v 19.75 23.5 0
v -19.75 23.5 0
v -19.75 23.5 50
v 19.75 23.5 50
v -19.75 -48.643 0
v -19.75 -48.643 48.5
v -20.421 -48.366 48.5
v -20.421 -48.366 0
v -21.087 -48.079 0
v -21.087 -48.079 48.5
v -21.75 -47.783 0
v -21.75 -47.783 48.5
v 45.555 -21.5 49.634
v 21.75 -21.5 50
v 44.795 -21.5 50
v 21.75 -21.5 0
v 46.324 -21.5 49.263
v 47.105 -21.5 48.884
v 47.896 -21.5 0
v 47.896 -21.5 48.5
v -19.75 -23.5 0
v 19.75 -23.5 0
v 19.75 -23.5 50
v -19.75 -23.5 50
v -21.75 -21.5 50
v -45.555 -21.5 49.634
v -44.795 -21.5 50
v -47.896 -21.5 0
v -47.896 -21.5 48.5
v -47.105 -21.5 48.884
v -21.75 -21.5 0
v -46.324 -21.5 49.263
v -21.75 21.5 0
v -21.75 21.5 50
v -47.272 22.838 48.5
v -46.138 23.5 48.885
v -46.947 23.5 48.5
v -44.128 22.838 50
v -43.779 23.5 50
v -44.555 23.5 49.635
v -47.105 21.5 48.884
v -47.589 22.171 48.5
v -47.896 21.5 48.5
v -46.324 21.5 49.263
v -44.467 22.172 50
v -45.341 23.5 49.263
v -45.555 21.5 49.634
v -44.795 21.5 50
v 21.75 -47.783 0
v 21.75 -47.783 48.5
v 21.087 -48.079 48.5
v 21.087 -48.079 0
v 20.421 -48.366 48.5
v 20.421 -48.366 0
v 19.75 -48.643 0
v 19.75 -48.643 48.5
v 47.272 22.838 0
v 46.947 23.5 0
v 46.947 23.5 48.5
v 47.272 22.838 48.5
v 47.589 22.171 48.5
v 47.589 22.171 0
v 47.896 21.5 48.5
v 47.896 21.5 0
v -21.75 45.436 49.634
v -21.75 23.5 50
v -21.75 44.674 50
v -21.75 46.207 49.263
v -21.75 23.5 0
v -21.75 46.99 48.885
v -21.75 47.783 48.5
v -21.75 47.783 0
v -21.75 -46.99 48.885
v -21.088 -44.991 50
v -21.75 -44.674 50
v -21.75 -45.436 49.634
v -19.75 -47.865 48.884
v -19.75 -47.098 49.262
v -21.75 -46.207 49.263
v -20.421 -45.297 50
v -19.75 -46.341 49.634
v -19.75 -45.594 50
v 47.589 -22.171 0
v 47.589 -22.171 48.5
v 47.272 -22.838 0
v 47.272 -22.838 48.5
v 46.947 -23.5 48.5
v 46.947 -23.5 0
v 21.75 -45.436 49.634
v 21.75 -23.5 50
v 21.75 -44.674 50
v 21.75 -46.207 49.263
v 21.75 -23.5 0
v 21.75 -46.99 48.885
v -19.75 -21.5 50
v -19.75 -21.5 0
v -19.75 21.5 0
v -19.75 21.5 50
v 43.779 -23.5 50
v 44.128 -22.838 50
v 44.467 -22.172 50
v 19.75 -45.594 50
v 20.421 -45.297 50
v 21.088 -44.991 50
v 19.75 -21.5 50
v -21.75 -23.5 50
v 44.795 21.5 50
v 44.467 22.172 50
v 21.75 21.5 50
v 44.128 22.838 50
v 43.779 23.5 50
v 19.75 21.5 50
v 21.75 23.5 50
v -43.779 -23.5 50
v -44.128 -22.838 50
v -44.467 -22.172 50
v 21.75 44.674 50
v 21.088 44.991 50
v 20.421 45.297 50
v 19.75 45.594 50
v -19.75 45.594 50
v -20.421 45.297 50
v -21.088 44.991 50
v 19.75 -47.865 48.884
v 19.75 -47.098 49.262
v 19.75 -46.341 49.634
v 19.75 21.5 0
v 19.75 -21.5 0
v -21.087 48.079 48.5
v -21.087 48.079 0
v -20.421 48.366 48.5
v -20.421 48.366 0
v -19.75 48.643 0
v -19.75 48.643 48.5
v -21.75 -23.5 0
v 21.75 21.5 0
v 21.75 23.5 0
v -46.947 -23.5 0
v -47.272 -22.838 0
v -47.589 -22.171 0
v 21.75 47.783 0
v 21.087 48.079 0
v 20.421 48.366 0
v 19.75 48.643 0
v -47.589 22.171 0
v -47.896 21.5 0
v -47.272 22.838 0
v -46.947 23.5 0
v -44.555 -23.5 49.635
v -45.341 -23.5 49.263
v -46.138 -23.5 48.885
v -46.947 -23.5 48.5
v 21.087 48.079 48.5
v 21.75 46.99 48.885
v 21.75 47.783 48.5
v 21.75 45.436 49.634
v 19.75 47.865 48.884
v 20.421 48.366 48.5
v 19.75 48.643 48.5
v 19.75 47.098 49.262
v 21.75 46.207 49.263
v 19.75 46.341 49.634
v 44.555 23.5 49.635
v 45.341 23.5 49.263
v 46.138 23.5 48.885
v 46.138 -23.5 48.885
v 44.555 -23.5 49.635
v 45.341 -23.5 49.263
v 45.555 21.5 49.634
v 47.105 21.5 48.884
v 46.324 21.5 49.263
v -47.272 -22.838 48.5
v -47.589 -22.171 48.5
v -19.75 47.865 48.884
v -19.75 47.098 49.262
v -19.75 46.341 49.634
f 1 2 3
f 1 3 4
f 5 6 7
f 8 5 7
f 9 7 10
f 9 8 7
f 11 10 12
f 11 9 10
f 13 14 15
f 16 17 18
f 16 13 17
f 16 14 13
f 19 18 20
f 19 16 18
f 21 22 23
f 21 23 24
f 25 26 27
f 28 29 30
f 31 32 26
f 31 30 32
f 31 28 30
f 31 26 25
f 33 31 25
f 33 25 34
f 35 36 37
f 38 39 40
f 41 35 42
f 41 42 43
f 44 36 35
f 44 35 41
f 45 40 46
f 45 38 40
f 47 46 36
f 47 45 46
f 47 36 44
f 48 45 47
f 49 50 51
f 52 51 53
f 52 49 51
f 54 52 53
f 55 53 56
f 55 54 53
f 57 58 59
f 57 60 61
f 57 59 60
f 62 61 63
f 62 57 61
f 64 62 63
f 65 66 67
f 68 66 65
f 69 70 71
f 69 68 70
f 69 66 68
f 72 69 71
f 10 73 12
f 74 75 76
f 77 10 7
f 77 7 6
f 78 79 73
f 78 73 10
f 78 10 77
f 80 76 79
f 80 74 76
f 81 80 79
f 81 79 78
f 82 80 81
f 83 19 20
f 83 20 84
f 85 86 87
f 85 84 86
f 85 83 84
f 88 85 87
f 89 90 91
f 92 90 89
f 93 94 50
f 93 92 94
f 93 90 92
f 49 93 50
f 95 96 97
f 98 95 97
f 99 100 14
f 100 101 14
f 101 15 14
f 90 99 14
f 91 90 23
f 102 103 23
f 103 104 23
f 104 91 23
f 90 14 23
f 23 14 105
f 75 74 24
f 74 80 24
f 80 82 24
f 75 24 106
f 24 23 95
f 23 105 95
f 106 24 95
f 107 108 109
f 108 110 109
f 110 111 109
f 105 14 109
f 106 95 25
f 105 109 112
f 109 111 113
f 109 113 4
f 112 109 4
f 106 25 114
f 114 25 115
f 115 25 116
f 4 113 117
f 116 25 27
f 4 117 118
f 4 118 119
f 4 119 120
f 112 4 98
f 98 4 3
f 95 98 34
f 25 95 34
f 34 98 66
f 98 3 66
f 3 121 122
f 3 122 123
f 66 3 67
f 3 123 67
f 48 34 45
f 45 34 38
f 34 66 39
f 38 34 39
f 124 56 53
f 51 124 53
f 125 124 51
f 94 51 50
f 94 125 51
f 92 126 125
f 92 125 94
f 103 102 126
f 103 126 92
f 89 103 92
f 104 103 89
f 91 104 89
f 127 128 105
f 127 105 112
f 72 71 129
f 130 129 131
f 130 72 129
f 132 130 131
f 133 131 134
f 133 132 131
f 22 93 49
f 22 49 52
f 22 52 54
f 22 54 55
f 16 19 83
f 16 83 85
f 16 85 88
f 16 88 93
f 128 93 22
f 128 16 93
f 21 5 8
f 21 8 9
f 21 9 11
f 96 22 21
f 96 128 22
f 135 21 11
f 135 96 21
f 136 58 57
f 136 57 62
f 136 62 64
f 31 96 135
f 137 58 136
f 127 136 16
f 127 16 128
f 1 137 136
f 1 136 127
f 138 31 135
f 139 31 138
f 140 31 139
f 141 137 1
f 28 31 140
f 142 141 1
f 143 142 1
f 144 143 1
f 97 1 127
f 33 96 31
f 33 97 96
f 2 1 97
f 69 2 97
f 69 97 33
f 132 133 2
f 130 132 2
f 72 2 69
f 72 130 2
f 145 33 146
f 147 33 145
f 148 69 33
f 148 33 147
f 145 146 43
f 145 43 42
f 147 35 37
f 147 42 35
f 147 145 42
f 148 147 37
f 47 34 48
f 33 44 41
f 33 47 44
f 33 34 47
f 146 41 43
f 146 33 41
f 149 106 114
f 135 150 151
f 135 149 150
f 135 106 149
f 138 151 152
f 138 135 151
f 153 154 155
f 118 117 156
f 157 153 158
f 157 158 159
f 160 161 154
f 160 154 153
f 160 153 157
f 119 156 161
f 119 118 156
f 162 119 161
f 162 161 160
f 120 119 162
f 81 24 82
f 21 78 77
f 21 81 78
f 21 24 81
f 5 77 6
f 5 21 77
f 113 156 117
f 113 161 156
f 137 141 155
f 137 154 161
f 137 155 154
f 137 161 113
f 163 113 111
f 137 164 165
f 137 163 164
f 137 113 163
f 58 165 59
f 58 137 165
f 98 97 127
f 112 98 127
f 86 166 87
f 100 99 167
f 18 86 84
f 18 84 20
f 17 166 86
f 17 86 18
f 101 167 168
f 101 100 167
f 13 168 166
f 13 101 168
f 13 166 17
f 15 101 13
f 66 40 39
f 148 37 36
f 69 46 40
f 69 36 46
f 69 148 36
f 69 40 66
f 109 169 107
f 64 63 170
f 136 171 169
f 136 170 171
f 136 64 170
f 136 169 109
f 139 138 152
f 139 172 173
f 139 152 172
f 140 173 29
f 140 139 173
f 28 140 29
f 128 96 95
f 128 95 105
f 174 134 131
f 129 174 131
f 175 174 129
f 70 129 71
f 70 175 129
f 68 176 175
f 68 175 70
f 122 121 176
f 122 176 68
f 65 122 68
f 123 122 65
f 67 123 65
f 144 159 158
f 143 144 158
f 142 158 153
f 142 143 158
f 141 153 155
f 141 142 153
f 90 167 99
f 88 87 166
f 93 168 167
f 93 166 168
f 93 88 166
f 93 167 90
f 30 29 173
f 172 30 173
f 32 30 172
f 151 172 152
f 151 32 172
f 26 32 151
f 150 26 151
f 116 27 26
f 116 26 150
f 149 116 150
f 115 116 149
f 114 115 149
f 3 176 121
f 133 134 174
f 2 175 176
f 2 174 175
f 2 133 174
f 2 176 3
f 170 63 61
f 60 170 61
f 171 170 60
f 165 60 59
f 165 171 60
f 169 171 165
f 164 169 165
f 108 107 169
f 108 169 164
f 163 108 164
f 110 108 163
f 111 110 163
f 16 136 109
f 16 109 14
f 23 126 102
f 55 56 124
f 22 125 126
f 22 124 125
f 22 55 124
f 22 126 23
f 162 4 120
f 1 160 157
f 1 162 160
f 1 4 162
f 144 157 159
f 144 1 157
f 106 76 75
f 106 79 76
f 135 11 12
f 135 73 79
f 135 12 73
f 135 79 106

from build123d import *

# Parameters (mm, degrees)
SKETCH1_W           = 39.5
SKETCH1_H           = 43
BOSS_EXTRUDE1_DEPTH = 50


with BuildPart() as part:
    # Sketch1 → Boss-Extrude1 (new body)
    with BuildSketch(Plane.XY):
        with BuildLine():
            Line((-19.75, 48.643473355), (-19.75, 23.5))
            Line((-19.75, 23.5), (19.75, 23.5))
            Line((19.75, 23.5), (19.75, 48.643473355))
            ThreePointArc((19.75, 48.643473355), (20.754462841, 48.223461844), (21.75, 47.782711309))
            Line((21.75, 47.782711309), (21.75, 23.5))
            Line((21.75, 23.5), (46.946778377, 23.5))
            ThreePointArc((46.946778377, 23.5), (47.431791843, 22.505002168), (47.895720059, 21.5))
            Line((47.895720059, 21.5), (21.75, 21.5))
            Line((21.75, 21.5), (21.75, -21.5))
            Line((21.75, -21.5), (47.895720059, -21.5))
            ThreePointArc((47.895720059, -21.5), (47.431791843, -22.505002168), (46.946778377, -23.5))
            Line((46.946778377, -23.5), (21.75, -23.5))
            Line((21.75, -23.5), (21.75, -47.782711309))
            ThreePointArc((21.75, -47.782711309), (20.754462841, -48.223461844), (19.75, -48.643473355))
            Line((19.75, -48.643473355), (19.75, -23.5))
            Line((19.75, -23.5), (-19.75, -23.5))
            Line((-19.75, -23.5), (-19.75, -48.643473355))
            ThreePointArc((-19.75, -48.643473355), (-20.754462841, -48.223461844), (-21.75, -47.782711309))
            Line((-21.75, -47.782711309), (-21.75, -23.5))
            Line((-21.75, -23.5), (-46.946778377, -23.5))
            ThreePointArc((-46.946778377, -23.5), (-47.431791843, -22.505002168), (-47.895720059, -21.5))
            Line((-47.895720059, -21.5), (-21.75, -21.5))
            Line((-21.75, -21.5), (-21.75, 21.5))
            Line((-21.75, 21.5), (-47.895720059, 21.5))
            ThreePointArc((-47.895720059, 21.5), (-47.431791843, 22.505002168), (-46.946778377, 23.5))
            Line((-46.946778377, 23.5), (-21.75, 23.5))
            Line((-21.75, 23.5), (-21.75, 47.782711309))
            ThreePointArc((-21.75, 47.782711309), (-20.754462841, 48.223461844), (-19.75, 48.643473355))
        make_face()
        Rectangle(SKETCH1_W, SKETCH1_H, mode=Mode.SUBTRACT)
    extrude(amount=BOSS_EXTRUDE1_DEPTH)

    # Sketch2 → Cut-Revolve1 (revolve, cut)
    with BuildSketch(Plane(origin=(0, 0, 0), x_dir=(1, 0, 0), z_dir=(0, 1, 0))):
        Polygon((-52.5, -48.5), (-23.44, -64), (0, -64), (0, -76.924912946), (-62.730842365, -76.924912946), (-62.730842365, -48.5), align=None)
    revolve(axis=Axis((0, 0, -17.212629341), (0, 0, 1)), mode=Mode.SUBTRACT)


solid = part.part
